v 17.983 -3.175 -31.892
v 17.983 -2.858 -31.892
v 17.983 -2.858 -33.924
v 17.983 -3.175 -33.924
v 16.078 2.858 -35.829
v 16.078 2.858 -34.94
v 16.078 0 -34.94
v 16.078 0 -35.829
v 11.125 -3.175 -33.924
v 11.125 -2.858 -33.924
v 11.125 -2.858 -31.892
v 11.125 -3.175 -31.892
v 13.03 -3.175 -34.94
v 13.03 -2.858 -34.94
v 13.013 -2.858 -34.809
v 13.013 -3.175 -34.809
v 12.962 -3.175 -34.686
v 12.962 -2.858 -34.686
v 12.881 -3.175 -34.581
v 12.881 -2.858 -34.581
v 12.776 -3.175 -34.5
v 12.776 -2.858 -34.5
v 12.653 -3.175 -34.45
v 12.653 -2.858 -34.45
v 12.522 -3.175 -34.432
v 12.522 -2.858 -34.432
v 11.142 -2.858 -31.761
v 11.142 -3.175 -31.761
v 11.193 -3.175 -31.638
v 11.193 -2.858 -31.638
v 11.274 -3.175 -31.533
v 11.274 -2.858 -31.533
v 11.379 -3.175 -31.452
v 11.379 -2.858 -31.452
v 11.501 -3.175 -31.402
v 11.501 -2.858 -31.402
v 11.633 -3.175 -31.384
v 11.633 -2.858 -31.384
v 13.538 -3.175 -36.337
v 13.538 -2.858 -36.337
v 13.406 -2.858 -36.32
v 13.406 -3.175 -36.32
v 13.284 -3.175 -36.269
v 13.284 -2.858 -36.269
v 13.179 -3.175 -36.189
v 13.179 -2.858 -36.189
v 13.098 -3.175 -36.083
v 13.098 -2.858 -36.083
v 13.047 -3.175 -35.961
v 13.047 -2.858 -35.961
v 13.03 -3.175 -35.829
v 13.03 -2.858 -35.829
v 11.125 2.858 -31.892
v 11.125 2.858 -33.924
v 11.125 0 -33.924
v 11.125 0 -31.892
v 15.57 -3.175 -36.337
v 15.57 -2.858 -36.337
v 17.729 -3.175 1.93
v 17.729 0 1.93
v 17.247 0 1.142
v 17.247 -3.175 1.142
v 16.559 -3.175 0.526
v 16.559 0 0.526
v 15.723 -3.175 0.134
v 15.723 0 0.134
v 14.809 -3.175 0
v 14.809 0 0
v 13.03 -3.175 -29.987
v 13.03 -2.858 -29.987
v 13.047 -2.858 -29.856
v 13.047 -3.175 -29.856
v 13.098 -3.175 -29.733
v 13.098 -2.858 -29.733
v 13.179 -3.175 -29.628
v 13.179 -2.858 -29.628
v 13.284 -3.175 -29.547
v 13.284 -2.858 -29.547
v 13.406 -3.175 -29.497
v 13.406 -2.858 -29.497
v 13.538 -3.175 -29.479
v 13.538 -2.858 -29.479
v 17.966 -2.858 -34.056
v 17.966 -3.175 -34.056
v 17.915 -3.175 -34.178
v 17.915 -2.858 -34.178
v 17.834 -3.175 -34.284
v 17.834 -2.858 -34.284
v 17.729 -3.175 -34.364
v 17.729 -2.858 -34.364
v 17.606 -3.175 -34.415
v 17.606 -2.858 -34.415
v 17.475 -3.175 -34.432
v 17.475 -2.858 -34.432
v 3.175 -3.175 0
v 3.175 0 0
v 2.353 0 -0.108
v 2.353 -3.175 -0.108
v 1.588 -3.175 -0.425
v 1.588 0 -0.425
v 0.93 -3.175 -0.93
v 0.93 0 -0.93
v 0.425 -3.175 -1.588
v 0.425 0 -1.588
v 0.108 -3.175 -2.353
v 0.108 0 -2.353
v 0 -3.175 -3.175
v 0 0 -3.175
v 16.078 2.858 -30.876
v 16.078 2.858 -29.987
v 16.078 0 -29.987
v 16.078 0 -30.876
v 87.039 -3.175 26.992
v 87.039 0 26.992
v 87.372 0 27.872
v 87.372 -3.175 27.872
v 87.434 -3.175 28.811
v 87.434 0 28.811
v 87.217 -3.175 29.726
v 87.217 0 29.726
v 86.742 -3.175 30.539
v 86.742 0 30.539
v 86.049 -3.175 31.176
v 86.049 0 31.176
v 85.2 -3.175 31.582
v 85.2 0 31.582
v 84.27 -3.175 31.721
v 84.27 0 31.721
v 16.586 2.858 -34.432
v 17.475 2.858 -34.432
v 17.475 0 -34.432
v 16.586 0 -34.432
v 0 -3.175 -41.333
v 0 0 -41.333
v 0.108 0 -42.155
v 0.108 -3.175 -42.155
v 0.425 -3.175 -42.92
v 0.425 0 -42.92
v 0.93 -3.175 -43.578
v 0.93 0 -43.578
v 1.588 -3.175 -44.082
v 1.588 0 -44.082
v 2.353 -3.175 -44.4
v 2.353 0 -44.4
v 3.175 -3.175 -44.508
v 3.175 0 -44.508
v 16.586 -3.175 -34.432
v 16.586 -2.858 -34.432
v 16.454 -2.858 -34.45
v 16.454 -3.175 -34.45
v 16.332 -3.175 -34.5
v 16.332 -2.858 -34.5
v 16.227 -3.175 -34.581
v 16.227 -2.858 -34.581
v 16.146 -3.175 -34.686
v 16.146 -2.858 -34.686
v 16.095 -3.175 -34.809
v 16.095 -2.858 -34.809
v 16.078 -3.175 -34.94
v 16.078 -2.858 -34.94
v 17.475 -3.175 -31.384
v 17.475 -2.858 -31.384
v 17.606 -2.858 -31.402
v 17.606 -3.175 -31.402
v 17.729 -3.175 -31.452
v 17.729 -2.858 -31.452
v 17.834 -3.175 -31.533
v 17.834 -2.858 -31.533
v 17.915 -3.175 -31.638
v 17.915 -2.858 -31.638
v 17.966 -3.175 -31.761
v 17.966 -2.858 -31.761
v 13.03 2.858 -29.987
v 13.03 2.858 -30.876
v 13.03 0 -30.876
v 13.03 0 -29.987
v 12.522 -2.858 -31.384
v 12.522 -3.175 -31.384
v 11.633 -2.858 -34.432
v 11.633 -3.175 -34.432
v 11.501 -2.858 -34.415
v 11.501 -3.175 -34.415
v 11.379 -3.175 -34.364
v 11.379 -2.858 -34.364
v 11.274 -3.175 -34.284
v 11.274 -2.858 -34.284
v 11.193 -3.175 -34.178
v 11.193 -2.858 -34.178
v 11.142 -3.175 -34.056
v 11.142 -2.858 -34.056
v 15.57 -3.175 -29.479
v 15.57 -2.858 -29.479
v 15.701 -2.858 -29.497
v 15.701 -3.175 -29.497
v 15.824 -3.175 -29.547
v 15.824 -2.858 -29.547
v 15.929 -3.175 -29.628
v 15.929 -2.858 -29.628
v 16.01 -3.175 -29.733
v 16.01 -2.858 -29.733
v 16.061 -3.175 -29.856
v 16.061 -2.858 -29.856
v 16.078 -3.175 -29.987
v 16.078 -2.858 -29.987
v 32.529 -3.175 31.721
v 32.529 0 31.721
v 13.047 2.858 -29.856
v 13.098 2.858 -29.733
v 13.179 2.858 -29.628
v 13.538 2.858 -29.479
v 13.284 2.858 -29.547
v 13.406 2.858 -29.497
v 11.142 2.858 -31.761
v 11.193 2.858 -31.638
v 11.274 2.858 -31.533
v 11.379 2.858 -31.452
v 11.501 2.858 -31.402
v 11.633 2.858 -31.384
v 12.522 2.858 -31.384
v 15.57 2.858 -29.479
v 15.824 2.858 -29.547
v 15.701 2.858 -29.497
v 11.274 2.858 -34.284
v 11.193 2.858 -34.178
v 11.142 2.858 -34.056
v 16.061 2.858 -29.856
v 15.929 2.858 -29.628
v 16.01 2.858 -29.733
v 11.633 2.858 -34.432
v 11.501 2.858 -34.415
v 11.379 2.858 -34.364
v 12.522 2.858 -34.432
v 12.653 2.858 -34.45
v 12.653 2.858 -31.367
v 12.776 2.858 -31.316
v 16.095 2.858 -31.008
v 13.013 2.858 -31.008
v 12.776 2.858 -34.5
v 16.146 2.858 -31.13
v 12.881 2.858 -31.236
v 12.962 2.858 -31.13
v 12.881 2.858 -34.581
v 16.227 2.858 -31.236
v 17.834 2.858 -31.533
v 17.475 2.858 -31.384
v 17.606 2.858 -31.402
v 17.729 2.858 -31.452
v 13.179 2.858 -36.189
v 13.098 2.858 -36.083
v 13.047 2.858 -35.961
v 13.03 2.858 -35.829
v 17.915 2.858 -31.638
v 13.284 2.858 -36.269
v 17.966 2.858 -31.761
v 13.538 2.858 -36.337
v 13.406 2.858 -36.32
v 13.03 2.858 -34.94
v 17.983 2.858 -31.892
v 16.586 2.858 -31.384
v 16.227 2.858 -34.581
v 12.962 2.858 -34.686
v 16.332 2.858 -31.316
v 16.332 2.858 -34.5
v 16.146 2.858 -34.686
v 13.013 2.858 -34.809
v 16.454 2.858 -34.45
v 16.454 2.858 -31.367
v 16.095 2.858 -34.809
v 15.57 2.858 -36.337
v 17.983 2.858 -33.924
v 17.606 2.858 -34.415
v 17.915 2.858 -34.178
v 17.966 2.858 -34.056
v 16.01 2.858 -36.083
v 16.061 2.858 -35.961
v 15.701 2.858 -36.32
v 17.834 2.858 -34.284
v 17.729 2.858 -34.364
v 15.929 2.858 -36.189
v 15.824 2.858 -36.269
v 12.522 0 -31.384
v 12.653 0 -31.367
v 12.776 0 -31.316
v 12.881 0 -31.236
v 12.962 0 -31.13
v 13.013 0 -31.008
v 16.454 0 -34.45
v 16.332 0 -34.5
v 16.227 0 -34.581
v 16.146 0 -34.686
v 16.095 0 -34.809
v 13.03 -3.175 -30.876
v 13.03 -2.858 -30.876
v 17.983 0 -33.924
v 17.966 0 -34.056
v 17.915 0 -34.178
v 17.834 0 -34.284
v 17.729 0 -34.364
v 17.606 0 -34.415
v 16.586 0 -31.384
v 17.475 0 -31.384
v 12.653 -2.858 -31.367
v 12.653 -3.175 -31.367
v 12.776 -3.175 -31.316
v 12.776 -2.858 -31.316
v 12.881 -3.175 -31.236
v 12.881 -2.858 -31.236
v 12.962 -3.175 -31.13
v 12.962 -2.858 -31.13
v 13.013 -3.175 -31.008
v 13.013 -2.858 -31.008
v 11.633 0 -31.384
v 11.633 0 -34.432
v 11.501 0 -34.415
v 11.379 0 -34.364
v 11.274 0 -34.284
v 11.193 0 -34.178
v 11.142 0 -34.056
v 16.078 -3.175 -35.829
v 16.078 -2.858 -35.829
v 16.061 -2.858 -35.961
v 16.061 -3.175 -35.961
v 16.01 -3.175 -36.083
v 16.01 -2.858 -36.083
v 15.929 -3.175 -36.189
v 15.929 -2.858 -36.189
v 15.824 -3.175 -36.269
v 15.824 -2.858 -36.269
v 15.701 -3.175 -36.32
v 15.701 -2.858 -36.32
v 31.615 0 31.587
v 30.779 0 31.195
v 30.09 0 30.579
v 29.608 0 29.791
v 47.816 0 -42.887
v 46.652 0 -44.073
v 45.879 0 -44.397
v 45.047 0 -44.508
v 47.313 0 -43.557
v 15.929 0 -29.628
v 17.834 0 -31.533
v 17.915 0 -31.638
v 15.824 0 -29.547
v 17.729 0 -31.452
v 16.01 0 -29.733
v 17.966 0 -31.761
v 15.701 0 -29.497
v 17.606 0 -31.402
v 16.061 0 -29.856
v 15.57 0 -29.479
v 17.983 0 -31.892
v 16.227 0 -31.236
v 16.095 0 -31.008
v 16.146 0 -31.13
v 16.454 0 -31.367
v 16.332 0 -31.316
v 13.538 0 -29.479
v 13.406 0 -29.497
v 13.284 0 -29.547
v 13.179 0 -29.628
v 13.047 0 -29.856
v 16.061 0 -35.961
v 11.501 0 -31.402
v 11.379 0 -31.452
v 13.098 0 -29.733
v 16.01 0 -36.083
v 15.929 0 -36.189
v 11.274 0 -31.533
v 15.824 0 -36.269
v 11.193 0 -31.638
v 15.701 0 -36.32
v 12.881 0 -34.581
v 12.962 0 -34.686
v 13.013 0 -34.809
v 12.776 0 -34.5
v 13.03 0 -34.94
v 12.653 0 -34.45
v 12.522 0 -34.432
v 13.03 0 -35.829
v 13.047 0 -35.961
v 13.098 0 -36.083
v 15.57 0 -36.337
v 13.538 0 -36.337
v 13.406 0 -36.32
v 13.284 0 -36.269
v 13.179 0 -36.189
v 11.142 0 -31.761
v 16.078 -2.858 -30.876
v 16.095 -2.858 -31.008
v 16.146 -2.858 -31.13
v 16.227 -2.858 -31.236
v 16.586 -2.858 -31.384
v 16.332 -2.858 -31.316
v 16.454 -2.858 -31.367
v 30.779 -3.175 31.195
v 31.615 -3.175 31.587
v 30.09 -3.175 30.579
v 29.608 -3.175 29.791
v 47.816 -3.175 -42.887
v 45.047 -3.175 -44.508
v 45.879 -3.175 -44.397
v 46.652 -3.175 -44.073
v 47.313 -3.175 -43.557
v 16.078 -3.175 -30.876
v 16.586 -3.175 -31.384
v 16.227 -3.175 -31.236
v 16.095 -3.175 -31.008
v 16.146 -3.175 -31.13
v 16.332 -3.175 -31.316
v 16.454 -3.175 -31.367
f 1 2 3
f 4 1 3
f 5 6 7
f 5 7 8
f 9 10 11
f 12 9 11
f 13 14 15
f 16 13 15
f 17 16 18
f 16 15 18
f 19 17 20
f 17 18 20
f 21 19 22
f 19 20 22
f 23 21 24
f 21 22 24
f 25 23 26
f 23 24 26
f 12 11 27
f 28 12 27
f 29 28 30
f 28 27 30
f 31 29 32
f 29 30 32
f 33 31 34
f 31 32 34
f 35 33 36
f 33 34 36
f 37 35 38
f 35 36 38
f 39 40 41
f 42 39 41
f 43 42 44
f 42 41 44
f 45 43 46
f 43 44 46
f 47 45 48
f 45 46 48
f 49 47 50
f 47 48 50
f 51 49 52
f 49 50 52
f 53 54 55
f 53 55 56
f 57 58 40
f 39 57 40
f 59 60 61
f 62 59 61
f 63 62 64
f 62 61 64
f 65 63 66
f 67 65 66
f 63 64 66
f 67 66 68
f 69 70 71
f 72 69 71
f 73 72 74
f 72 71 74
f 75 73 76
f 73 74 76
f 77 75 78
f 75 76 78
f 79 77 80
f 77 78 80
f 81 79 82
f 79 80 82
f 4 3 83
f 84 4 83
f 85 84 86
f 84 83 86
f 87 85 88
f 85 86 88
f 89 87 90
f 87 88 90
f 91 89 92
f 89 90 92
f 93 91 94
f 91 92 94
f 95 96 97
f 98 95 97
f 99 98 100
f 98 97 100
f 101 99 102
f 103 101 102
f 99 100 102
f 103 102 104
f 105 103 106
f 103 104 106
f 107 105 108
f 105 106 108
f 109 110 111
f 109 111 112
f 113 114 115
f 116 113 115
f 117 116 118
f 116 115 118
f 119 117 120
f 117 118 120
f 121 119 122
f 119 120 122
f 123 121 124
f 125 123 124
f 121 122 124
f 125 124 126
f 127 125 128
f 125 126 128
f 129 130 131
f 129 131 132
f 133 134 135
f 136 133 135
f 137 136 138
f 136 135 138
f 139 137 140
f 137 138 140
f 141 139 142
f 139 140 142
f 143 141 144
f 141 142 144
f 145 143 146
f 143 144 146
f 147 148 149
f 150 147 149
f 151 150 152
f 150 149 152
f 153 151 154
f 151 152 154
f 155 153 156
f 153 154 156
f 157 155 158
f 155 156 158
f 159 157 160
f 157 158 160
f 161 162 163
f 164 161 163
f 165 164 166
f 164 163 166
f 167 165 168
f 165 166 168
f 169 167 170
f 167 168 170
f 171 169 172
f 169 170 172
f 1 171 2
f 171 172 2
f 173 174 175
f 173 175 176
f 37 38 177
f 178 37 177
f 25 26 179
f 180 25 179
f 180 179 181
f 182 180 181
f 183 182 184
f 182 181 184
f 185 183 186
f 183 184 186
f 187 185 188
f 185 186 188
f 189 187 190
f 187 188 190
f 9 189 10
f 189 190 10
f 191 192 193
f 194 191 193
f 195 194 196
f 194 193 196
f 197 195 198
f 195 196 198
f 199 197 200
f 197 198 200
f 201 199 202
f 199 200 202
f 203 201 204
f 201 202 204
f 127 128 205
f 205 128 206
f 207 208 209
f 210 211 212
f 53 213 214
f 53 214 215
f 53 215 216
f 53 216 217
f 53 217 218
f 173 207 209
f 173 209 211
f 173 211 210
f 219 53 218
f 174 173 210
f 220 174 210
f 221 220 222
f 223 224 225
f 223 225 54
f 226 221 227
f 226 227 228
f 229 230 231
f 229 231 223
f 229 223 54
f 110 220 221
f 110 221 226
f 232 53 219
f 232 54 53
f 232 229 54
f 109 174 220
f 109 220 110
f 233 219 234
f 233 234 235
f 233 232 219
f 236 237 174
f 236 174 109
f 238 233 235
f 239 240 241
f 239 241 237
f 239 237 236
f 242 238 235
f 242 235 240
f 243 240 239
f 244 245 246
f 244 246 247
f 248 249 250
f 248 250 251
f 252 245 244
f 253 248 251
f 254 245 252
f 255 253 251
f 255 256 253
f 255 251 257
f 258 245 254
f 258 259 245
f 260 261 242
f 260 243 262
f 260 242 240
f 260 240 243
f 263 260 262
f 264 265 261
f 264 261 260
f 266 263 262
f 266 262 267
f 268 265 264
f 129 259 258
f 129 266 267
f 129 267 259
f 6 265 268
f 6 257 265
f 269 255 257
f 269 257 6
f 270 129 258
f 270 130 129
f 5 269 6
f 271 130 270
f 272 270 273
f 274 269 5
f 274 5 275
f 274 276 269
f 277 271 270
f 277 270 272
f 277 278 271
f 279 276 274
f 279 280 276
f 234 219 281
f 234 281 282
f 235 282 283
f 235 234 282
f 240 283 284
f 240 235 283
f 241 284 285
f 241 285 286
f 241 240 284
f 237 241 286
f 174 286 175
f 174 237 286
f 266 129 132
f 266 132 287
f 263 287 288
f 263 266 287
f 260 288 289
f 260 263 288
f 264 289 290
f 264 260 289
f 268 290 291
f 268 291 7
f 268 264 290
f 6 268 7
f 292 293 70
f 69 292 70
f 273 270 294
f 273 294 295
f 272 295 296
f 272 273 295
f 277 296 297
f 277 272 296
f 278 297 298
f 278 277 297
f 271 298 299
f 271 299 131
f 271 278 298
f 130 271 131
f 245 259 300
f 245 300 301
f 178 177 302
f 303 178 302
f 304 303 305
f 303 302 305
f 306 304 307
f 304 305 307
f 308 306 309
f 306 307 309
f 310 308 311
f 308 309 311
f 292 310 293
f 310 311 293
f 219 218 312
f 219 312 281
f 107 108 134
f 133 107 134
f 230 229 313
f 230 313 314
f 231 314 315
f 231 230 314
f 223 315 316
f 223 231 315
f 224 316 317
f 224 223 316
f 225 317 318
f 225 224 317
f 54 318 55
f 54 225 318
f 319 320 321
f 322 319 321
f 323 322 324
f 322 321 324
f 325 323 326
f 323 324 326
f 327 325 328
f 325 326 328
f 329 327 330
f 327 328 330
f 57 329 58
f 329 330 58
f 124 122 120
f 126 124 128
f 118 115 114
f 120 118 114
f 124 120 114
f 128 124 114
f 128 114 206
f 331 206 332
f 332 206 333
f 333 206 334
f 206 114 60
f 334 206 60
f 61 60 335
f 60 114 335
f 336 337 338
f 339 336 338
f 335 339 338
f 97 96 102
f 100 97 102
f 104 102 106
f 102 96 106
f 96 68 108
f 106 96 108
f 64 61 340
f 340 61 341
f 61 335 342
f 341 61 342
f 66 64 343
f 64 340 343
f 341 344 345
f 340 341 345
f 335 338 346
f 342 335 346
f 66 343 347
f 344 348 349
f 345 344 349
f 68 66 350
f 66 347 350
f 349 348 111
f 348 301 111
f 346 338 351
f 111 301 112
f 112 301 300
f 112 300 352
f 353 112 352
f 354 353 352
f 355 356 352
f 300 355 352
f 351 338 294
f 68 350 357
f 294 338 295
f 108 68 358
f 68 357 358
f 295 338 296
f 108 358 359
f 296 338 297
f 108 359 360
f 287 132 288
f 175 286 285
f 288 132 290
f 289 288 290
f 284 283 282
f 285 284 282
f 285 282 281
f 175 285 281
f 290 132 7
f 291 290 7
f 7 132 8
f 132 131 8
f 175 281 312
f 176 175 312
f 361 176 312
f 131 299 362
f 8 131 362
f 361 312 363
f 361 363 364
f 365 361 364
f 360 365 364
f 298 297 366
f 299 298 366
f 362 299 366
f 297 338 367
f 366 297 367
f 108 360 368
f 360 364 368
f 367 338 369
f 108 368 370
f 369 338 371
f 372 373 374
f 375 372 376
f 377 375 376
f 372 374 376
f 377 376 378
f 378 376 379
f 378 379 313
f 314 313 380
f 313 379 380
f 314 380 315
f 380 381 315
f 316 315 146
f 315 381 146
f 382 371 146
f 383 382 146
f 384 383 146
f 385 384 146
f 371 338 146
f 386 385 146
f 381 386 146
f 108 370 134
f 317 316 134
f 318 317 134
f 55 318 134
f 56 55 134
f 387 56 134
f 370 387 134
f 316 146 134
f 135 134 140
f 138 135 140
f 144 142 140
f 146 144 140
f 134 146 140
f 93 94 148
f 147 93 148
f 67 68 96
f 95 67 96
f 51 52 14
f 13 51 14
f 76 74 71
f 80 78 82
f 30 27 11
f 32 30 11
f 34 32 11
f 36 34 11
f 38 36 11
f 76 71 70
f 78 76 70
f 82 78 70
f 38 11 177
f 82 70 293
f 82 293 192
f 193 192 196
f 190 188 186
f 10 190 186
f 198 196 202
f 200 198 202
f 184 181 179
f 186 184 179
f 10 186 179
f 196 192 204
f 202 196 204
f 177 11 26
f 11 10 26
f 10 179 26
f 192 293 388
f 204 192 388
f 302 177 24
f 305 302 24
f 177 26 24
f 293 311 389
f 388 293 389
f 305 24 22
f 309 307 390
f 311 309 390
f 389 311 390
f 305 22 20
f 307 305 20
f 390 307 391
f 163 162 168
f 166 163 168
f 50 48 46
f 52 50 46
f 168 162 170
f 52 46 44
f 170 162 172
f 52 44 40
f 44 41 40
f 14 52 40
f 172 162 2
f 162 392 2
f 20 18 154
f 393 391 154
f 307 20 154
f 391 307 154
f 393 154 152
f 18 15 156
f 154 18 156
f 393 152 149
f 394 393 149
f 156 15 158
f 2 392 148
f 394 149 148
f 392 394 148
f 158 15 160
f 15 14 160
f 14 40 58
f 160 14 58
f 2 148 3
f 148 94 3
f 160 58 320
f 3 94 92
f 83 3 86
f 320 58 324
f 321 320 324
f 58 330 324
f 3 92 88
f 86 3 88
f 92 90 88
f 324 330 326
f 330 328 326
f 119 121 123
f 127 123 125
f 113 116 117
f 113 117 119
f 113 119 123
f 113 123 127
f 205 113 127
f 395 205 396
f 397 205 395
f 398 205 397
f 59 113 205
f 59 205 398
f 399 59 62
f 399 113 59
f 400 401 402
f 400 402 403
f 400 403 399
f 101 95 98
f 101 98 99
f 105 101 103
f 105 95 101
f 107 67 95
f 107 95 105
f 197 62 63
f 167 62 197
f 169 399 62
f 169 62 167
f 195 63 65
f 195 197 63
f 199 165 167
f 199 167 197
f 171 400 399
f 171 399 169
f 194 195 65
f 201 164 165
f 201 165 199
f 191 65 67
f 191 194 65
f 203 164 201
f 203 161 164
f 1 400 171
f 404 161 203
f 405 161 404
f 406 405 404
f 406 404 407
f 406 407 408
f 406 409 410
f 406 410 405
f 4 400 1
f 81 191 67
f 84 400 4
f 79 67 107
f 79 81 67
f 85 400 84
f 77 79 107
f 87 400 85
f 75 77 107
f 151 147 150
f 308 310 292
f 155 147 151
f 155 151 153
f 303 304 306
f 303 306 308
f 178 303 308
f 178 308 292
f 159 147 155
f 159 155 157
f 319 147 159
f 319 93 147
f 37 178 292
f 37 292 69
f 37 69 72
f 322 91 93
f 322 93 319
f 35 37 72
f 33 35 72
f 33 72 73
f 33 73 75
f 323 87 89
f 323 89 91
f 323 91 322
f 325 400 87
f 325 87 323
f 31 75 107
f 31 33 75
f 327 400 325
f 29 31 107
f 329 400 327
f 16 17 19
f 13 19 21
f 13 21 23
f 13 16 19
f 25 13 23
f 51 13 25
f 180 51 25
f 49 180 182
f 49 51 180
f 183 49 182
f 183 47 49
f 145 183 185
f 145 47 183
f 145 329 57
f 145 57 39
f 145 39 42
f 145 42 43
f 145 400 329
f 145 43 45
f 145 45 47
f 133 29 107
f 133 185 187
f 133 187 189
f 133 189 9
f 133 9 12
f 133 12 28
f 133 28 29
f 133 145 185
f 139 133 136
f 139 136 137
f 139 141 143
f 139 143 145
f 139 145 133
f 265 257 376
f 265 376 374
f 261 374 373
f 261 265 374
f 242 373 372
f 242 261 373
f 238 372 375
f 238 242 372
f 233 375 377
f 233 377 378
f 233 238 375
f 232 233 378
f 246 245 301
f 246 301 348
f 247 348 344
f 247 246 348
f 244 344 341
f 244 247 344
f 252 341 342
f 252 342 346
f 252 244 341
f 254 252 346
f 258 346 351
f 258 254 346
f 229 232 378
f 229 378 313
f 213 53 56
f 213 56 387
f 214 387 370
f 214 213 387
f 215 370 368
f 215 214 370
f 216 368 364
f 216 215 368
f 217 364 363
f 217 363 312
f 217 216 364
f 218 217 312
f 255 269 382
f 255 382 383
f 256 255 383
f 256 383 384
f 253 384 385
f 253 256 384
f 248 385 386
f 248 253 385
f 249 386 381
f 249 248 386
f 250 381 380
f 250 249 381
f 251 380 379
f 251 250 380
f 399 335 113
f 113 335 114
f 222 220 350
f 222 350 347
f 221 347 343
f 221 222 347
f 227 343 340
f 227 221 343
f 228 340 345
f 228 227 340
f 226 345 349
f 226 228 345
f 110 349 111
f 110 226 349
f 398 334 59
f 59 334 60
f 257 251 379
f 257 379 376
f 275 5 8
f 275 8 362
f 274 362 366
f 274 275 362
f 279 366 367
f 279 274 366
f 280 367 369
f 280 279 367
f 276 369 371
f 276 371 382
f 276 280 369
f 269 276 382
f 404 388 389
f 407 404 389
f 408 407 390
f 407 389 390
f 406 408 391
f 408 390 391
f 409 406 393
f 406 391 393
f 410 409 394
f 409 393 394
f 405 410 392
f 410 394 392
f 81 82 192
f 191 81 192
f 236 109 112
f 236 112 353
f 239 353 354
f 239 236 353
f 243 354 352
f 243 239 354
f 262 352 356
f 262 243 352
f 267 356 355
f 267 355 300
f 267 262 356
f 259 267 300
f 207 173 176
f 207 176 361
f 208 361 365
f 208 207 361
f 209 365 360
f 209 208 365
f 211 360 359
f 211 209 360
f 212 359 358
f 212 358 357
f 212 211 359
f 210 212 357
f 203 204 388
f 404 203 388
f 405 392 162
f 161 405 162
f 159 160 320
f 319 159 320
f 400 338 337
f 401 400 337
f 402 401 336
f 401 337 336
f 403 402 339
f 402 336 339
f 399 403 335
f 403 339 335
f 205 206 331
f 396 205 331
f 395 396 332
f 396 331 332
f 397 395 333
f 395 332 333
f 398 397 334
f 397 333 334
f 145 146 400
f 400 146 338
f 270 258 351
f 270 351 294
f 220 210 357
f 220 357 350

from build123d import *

# Parameters (mm, degrees)
EXTRUDE1_DEPTH = 3.175
EXTRUDE2_DEPTH = 2.8575


with BuildPart() as part:
    # Sketch1 → Extrude1 (new body)
    with BuildSketch(Plane(origin=(0, 0, 0), x_dir=(1, 0, 0), z_dir=(0, 1, 0))):
        with BuildLine():
            Line((3.175, 44.50785877), (45.047498502, 44.50785877))
            ThreePointArc((45.047498502, 44.50785877), (46.651643951, 44.072811758), (47.81618078, 42.886893339))
            Line((47.81618078, 42.886893339), (87.038547596, -26.992036046))
            ThreePointArc((87.038547596, -26.992036046), (87.009818306, -30.150216064), (84.269865318, -31.721070615))
            Line((84.269865318, -31.721070615), (32.528914715, -31.721070615))
            ThreePointArc((32.528914715, -31.721070615), (30.778624678, -31.195053398), (29.608292243, -29.791297251))
            Line((29.608292243, -29.791297251), (17.72934795, -1.929773364))
            ThreePointArc((17.72934795, -1.929773364), (16.559015516, -0.526017217), (14.808725478, 0))
            Line((14.808725478, 0), (3.175, 0))
            ThreePointArc((3.175, 0), (0.92993597, 0.92993597), (0, 3.175))
            Line((0, 3.175), (0, 41.33285877))
            ThreePointArc((0, 41.33285877), (0.92993597, 43.5779228), (3.175, 44.50785877))
        make_face()
        with BuildLine():
            Line((13.029814646, 30.876332876), (13.029814646, 29.987332876))
            ThreePointArc((13.029814646, 29.987332876), (13.178604401, 29.628122631), (13.537814646, 29.479332876))
            Line((13.537814646, 29.479332876), (15.569814646, 29.479332876))
            ThreePointArc((15.569814646, 29.479332876), (15.929024891, 29.628122631), (16.077814646, 29.987332876))
            Line((16.077814646, 29.987332876), (16.077814646, 30.876332876))
            ThreePointArc((16.077814646, 30.876332876), (16.226604401, 31.235543121), (16.585814646, 31.384332876))
            Line((16.585814646, 31.384332876), (17.474814646, 31.384332876))
            ThreePointArc((17.474814646, 31.384332876), (17.834024891, 31.533122631), (17.982814646, 31.892332876))
            Line((17.982814646, 31.892332876), (17.982814646, 33.924332876))
            ThreePointArc((17.982814646, 33.924332876), (17.834024891, 34.283543121), (17.474814646, 34.432332876))
            Line((17.474814646, 34.432332876), (16.585814646, 34.432332876))
            ThreePointArc((16.585814646, 34.432332876), (16.226604401, 34.581122631), (16.077814646, 34.940332876))
            Line((16.077814646, 34.940332876), (16.077814646, 35.829332876))
            ThreePointArc((16.077814646, 35.829332876), (15.929024891, 36.188543121), (15.569814646, 36.337332876))
            Line((15.569814646, 36.337332876), (13.537814646, 36.337332876))
            ThreePointArc((13.537814646, 36.337332876), (13.178604401, 36.188543121), (13.029814646, 35.829332876))
            Line((13.029814646, 35.829332876), (13.029814646, 34.940332876))
            ThreePointArc((13.029814646, 34.940332876), (12.881024891, 34.581122631), (12.521814646, 34.432332876))
            Line((12.521814646, 34.432332876), (11.632814646, 34.432332876))
            ThreePointArc((11.632814646, 34.432332876), (11.273604401, 34.283543121), (11.124814646, 33.924332876))
            Line((11.124814646, 33.924332876), (11.124814646, 31.892332876))
            ThreePointArc((11.124814646, 31.892332876), (11.273604401, 31.533122631), (11.632814646, 31.384332876))
            Line((11.632814646, 31.384332876), (12.521814646, 31.384332876))
            ThreePointArc((12.521814646, 31.384332876), (12.881024891, 31.235543121), (13.029814646, 30.876332876))
        make_face(mode=Mode.SUBTRACT)
    extrude(amount=-EXTRUDE1_DEPTH)

    # Sketch4 → Extrude2 (add, symmetric)
    with BuildSketch(Plane(origin=(0, 0, 0), x_dir=(1, 0, 0), z_dir=(0, 1, 0))):
        with BuildLine():
            Line((15.569814646, 36.337332876), (13.537814646, 36.337332876))
            ThreePointArc((13.537814646, 36.337332876), (13.178604401, 36.188543121), (13.029814646, 35.829332876))
            Line((13.029814646, 35.829332876), (13.029814646, 34.940332876))
            ThreePointArc((13.029814646, 34.940332876), (12.881024891, 34.581122631), (12.521814646, 34.432332876))
            Line((12.521814646, 34.432332876), (11.632814646, 34.432332876))
            ThreePointArc((11.632814646, 34.432332876), (11.273604401, 34.283543121), (11.124814646, 33.924332876))
            Line((11.124814646, 33.924332876), (11.124814646, 31.892332876))
            ThreePointArc((11.124814646, 31.892332876), (11.273604401, 31.533122631), (11.632814646, 31.384332876))
            Line((11.632814646, 31.384332876), (12.521814646, 31.384332876))
            ThreePointArc((12.521814646, 31.384332876), (12.881024891, 31.235543121), (13.029814646, 30.876332876))
            Line((13.029814646, 30.876332876), (13.029814646, 29.987332876))
            ThreePointArc((13.029814646, 29.987332876), (13.178604401, 29.628122631), (13.537814646, 29.479332876))
            Line((13.537814646, 29.479332876), (15.569814646, 29.479332876))
            ThreePointArc((15.569814646, 29.479332876), (15.929024891, 29.628122631), (16.077814646, 29.987332876))
            Line((16.077814646, 29.987332876), (16.077814646, 30.876332876))
            ThreePointArc((16.077814646, 30.876332876), (16.226604401, 31.235543121), (16.585814646, 31.384332876))
            Line((16.585814646, 31.384332876), (17.474814646, 31.384332876))
            ThreePointArc((17.474814646, 31.384332876), (17.834024891, 31.533122631), (17.982814646, 31.892332876))
            Line((17.982814646, 31.892332876), (17.982814646, 33.924332876))
            ThreePointArc((17.982814646, 33.924332876), (17.834024891, 34.283543121), (17.474814646, 34.432332876))
            Line((17.474814646, 34.432332876), (16.585814646, 34.432332876))
            ThreePointArc((16.585814646, 34.432332876), (16.226604401, 34.581122631), (16.077814646, 34.940332876))
            Line((16.077814646, 34.940332876), (16.077814646, 35.829332876))
            ThreePointArc((16.077814646, 35.829332876), (15.929024891, 36.188543121), (15.569814646, 36.337332876))
        make_face()
    extrude(amount=EXTRUDE2_DEPTH, both=True)


solid = part.part
